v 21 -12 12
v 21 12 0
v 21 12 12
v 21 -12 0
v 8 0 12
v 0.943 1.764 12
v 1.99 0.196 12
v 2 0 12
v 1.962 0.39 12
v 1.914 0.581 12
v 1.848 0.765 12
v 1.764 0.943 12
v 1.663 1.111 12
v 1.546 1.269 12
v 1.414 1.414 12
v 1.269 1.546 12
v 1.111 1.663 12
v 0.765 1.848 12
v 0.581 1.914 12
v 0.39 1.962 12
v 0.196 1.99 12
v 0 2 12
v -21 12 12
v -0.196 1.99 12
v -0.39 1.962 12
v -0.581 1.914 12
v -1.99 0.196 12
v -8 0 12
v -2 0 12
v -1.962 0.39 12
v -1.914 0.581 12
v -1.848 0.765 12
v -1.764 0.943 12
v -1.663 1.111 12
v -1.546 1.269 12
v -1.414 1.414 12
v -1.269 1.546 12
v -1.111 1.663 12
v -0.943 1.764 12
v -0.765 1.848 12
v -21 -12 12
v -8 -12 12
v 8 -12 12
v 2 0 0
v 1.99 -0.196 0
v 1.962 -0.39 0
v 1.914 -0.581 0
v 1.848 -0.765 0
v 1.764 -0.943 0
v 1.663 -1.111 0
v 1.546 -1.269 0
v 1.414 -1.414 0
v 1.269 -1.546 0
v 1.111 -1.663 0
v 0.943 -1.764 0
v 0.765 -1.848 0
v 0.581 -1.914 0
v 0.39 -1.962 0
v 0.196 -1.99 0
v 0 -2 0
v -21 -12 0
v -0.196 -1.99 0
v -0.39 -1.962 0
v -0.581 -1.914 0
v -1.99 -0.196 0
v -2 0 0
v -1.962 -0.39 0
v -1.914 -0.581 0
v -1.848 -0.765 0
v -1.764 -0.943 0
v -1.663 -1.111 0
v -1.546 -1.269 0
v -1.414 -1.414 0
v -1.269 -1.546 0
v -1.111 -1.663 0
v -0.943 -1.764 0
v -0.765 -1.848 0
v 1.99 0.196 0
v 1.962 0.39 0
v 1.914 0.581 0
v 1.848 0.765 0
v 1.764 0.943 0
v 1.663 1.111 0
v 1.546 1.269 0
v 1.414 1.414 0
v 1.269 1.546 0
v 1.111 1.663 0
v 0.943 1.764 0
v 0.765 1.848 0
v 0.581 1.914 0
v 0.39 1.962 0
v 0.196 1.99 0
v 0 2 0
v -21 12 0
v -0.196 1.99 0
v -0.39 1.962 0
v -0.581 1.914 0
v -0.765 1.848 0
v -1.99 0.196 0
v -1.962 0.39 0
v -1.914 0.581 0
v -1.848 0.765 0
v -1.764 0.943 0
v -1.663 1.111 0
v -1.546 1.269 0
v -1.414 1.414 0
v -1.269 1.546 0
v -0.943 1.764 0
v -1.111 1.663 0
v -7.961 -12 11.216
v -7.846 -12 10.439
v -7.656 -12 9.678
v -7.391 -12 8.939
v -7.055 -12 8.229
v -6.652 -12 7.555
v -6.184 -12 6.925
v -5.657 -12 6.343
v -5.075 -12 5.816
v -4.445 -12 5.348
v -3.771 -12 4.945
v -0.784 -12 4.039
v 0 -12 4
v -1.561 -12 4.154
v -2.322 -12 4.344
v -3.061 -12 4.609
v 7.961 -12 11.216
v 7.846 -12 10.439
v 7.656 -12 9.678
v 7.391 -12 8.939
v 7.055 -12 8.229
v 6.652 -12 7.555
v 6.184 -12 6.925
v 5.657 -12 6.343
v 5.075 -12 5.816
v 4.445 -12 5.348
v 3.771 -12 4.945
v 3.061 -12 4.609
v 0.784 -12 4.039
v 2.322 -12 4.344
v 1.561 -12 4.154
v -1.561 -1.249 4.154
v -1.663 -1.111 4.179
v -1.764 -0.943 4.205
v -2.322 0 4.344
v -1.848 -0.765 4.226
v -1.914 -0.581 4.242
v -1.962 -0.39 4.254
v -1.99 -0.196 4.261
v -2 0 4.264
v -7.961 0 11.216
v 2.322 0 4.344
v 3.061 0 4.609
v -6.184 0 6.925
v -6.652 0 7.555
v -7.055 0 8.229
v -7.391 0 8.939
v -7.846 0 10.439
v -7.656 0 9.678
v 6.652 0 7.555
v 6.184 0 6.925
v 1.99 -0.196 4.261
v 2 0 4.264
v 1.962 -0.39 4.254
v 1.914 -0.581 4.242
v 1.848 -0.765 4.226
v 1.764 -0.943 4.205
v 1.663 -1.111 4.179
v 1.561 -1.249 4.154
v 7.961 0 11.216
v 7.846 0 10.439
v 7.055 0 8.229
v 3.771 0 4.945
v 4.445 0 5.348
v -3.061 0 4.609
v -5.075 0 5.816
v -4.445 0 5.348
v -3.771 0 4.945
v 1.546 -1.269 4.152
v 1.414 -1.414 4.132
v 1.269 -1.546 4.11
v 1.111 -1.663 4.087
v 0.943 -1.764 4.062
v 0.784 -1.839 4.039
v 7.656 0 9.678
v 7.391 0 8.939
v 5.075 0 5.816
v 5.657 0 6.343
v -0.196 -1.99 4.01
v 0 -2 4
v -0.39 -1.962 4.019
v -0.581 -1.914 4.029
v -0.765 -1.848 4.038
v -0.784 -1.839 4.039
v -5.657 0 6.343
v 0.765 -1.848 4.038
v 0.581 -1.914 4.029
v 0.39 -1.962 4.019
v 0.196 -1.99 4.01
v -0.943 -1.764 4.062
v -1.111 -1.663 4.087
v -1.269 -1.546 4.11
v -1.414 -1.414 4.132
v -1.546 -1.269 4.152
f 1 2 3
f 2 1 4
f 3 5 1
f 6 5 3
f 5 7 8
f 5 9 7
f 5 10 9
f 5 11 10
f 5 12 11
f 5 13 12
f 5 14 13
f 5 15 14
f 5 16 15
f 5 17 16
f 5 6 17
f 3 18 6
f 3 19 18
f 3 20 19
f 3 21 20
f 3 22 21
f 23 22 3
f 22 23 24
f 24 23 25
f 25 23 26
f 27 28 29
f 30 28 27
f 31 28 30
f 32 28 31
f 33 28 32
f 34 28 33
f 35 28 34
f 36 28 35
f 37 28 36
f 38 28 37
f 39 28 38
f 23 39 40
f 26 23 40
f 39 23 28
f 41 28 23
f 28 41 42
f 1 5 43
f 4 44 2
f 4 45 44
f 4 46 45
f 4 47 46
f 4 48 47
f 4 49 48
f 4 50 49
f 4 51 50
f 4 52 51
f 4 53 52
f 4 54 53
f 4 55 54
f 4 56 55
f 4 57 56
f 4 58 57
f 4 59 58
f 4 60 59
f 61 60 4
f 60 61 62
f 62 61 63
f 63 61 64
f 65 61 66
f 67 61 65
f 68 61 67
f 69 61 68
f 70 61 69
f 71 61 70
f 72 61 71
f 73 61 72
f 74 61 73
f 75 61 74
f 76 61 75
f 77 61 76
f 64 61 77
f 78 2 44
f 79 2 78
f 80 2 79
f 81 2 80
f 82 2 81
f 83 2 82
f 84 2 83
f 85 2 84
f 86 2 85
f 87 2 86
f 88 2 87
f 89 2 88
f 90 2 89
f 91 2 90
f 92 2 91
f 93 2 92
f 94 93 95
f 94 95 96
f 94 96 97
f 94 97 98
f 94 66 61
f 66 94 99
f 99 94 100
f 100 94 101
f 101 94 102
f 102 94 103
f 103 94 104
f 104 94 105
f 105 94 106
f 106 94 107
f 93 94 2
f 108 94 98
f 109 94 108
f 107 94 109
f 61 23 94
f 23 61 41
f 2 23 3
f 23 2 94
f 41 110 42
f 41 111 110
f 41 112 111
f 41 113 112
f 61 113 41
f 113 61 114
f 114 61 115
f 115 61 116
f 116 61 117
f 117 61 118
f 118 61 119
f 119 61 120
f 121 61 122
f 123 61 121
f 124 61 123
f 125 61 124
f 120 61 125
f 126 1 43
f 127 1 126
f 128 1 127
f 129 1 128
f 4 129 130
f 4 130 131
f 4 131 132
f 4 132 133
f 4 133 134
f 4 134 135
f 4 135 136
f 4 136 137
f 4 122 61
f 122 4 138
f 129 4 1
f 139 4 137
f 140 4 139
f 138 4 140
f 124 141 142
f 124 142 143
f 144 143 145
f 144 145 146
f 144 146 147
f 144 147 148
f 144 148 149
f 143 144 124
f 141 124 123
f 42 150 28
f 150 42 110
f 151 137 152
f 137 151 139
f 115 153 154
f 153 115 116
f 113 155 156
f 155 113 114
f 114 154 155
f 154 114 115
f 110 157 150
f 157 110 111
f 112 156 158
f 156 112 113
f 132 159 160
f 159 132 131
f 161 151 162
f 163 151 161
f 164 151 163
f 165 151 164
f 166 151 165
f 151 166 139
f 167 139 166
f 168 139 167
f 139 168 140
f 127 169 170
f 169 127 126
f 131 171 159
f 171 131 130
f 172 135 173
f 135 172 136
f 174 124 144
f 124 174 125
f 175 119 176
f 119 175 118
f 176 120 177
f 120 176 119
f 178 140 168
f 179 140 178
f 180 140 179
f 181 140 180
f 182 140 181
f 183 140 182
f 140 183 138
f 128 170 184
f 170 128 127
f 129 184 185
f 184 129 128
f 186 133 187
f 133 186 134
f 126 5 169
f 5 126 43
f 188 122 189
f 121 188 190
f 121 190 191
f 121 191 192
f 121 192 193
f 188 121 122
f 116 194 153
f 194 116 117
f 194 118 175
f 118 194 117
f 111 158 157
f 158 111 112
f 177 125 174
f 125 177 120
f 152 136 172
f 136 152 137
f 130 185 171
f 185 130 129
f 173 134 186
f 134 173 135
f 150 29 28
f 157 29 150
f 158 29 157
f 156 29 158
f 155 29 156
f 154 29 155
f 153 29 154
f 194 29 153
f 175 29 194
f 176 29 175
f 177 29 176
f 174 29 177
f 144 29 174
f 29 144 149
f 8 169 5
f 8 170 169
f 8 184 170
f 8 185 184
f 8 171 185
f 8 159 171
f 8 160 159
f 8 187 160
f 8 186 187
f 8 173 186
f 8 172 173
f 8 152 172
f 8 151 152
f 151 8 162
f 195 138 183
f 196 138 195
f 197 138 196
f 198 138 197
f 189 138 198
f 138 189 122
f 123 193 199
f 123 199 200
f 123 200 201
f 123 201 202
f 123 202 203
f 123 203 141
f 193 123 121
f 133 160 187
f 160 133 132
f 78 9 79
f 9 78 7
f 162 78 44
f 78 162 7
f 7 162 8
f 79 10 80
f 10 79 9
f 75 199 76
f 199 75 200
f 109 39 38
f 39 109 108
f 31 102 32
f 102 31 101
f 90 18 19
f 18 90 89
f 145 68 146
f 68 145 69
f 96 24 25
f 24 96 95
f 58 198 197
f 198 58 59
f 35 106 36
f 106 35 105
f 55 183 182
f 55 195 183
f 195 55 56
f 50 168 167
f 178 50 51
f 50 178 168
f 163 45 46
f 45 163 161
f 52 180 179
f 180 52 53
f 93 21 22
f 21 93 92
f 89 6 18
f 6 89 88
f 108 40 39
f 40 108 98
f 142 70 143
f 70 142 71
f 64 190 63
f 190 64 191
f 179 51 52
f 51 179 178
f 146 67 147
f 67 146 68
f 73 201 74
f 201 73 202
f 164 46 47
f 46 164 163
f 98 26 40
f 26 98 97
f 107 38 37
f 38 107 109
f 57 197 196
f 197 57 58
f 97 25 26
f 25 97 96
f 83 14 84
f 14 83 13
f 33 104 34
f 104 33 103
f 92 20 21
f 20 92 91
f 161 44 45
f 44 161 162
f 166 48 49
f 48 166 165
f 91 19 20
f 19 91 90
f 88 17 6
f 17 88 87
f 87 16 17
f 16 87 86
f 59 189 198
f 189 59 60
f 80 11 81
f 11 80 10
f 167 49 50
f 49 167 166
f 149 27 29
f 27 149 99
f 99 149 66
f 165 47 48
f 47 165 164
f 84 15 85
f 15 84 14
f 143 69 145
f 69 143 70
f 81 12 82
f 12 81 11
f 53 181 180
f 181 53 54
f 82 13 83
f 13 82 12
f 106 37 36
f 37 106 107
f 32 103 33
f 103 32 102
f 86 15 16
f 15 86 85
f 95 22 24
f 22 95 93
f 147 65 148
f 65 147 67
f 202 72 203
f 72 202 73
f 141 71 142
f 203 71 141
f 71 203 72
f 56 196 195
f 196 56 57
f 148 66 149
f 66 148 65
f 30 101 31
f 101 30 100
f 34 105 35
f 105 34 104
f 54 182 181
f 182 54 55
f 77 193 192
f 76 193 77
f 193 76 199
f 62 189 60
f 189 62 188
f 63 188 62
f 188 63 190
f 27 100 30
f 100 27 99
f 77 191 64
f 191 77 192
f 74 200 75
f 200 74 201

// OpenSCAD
// Generated with SolidPython2 for OpenSCAD task-006
$fn = 64;

difference() {
	translate(v = [-21.0, -12.0, 0]) {
		cube(size = [42, 24, 12]);
	}
	rotate(a = [90, 0, 0]) {
		translate(v = [0, 12, 0]) {
			cylinder(h = 28, r = 8);
		}
	}
	translate(v = [0, 0, -1]) {
		cylinder(h = 14, r = 2.0);
	}
}
